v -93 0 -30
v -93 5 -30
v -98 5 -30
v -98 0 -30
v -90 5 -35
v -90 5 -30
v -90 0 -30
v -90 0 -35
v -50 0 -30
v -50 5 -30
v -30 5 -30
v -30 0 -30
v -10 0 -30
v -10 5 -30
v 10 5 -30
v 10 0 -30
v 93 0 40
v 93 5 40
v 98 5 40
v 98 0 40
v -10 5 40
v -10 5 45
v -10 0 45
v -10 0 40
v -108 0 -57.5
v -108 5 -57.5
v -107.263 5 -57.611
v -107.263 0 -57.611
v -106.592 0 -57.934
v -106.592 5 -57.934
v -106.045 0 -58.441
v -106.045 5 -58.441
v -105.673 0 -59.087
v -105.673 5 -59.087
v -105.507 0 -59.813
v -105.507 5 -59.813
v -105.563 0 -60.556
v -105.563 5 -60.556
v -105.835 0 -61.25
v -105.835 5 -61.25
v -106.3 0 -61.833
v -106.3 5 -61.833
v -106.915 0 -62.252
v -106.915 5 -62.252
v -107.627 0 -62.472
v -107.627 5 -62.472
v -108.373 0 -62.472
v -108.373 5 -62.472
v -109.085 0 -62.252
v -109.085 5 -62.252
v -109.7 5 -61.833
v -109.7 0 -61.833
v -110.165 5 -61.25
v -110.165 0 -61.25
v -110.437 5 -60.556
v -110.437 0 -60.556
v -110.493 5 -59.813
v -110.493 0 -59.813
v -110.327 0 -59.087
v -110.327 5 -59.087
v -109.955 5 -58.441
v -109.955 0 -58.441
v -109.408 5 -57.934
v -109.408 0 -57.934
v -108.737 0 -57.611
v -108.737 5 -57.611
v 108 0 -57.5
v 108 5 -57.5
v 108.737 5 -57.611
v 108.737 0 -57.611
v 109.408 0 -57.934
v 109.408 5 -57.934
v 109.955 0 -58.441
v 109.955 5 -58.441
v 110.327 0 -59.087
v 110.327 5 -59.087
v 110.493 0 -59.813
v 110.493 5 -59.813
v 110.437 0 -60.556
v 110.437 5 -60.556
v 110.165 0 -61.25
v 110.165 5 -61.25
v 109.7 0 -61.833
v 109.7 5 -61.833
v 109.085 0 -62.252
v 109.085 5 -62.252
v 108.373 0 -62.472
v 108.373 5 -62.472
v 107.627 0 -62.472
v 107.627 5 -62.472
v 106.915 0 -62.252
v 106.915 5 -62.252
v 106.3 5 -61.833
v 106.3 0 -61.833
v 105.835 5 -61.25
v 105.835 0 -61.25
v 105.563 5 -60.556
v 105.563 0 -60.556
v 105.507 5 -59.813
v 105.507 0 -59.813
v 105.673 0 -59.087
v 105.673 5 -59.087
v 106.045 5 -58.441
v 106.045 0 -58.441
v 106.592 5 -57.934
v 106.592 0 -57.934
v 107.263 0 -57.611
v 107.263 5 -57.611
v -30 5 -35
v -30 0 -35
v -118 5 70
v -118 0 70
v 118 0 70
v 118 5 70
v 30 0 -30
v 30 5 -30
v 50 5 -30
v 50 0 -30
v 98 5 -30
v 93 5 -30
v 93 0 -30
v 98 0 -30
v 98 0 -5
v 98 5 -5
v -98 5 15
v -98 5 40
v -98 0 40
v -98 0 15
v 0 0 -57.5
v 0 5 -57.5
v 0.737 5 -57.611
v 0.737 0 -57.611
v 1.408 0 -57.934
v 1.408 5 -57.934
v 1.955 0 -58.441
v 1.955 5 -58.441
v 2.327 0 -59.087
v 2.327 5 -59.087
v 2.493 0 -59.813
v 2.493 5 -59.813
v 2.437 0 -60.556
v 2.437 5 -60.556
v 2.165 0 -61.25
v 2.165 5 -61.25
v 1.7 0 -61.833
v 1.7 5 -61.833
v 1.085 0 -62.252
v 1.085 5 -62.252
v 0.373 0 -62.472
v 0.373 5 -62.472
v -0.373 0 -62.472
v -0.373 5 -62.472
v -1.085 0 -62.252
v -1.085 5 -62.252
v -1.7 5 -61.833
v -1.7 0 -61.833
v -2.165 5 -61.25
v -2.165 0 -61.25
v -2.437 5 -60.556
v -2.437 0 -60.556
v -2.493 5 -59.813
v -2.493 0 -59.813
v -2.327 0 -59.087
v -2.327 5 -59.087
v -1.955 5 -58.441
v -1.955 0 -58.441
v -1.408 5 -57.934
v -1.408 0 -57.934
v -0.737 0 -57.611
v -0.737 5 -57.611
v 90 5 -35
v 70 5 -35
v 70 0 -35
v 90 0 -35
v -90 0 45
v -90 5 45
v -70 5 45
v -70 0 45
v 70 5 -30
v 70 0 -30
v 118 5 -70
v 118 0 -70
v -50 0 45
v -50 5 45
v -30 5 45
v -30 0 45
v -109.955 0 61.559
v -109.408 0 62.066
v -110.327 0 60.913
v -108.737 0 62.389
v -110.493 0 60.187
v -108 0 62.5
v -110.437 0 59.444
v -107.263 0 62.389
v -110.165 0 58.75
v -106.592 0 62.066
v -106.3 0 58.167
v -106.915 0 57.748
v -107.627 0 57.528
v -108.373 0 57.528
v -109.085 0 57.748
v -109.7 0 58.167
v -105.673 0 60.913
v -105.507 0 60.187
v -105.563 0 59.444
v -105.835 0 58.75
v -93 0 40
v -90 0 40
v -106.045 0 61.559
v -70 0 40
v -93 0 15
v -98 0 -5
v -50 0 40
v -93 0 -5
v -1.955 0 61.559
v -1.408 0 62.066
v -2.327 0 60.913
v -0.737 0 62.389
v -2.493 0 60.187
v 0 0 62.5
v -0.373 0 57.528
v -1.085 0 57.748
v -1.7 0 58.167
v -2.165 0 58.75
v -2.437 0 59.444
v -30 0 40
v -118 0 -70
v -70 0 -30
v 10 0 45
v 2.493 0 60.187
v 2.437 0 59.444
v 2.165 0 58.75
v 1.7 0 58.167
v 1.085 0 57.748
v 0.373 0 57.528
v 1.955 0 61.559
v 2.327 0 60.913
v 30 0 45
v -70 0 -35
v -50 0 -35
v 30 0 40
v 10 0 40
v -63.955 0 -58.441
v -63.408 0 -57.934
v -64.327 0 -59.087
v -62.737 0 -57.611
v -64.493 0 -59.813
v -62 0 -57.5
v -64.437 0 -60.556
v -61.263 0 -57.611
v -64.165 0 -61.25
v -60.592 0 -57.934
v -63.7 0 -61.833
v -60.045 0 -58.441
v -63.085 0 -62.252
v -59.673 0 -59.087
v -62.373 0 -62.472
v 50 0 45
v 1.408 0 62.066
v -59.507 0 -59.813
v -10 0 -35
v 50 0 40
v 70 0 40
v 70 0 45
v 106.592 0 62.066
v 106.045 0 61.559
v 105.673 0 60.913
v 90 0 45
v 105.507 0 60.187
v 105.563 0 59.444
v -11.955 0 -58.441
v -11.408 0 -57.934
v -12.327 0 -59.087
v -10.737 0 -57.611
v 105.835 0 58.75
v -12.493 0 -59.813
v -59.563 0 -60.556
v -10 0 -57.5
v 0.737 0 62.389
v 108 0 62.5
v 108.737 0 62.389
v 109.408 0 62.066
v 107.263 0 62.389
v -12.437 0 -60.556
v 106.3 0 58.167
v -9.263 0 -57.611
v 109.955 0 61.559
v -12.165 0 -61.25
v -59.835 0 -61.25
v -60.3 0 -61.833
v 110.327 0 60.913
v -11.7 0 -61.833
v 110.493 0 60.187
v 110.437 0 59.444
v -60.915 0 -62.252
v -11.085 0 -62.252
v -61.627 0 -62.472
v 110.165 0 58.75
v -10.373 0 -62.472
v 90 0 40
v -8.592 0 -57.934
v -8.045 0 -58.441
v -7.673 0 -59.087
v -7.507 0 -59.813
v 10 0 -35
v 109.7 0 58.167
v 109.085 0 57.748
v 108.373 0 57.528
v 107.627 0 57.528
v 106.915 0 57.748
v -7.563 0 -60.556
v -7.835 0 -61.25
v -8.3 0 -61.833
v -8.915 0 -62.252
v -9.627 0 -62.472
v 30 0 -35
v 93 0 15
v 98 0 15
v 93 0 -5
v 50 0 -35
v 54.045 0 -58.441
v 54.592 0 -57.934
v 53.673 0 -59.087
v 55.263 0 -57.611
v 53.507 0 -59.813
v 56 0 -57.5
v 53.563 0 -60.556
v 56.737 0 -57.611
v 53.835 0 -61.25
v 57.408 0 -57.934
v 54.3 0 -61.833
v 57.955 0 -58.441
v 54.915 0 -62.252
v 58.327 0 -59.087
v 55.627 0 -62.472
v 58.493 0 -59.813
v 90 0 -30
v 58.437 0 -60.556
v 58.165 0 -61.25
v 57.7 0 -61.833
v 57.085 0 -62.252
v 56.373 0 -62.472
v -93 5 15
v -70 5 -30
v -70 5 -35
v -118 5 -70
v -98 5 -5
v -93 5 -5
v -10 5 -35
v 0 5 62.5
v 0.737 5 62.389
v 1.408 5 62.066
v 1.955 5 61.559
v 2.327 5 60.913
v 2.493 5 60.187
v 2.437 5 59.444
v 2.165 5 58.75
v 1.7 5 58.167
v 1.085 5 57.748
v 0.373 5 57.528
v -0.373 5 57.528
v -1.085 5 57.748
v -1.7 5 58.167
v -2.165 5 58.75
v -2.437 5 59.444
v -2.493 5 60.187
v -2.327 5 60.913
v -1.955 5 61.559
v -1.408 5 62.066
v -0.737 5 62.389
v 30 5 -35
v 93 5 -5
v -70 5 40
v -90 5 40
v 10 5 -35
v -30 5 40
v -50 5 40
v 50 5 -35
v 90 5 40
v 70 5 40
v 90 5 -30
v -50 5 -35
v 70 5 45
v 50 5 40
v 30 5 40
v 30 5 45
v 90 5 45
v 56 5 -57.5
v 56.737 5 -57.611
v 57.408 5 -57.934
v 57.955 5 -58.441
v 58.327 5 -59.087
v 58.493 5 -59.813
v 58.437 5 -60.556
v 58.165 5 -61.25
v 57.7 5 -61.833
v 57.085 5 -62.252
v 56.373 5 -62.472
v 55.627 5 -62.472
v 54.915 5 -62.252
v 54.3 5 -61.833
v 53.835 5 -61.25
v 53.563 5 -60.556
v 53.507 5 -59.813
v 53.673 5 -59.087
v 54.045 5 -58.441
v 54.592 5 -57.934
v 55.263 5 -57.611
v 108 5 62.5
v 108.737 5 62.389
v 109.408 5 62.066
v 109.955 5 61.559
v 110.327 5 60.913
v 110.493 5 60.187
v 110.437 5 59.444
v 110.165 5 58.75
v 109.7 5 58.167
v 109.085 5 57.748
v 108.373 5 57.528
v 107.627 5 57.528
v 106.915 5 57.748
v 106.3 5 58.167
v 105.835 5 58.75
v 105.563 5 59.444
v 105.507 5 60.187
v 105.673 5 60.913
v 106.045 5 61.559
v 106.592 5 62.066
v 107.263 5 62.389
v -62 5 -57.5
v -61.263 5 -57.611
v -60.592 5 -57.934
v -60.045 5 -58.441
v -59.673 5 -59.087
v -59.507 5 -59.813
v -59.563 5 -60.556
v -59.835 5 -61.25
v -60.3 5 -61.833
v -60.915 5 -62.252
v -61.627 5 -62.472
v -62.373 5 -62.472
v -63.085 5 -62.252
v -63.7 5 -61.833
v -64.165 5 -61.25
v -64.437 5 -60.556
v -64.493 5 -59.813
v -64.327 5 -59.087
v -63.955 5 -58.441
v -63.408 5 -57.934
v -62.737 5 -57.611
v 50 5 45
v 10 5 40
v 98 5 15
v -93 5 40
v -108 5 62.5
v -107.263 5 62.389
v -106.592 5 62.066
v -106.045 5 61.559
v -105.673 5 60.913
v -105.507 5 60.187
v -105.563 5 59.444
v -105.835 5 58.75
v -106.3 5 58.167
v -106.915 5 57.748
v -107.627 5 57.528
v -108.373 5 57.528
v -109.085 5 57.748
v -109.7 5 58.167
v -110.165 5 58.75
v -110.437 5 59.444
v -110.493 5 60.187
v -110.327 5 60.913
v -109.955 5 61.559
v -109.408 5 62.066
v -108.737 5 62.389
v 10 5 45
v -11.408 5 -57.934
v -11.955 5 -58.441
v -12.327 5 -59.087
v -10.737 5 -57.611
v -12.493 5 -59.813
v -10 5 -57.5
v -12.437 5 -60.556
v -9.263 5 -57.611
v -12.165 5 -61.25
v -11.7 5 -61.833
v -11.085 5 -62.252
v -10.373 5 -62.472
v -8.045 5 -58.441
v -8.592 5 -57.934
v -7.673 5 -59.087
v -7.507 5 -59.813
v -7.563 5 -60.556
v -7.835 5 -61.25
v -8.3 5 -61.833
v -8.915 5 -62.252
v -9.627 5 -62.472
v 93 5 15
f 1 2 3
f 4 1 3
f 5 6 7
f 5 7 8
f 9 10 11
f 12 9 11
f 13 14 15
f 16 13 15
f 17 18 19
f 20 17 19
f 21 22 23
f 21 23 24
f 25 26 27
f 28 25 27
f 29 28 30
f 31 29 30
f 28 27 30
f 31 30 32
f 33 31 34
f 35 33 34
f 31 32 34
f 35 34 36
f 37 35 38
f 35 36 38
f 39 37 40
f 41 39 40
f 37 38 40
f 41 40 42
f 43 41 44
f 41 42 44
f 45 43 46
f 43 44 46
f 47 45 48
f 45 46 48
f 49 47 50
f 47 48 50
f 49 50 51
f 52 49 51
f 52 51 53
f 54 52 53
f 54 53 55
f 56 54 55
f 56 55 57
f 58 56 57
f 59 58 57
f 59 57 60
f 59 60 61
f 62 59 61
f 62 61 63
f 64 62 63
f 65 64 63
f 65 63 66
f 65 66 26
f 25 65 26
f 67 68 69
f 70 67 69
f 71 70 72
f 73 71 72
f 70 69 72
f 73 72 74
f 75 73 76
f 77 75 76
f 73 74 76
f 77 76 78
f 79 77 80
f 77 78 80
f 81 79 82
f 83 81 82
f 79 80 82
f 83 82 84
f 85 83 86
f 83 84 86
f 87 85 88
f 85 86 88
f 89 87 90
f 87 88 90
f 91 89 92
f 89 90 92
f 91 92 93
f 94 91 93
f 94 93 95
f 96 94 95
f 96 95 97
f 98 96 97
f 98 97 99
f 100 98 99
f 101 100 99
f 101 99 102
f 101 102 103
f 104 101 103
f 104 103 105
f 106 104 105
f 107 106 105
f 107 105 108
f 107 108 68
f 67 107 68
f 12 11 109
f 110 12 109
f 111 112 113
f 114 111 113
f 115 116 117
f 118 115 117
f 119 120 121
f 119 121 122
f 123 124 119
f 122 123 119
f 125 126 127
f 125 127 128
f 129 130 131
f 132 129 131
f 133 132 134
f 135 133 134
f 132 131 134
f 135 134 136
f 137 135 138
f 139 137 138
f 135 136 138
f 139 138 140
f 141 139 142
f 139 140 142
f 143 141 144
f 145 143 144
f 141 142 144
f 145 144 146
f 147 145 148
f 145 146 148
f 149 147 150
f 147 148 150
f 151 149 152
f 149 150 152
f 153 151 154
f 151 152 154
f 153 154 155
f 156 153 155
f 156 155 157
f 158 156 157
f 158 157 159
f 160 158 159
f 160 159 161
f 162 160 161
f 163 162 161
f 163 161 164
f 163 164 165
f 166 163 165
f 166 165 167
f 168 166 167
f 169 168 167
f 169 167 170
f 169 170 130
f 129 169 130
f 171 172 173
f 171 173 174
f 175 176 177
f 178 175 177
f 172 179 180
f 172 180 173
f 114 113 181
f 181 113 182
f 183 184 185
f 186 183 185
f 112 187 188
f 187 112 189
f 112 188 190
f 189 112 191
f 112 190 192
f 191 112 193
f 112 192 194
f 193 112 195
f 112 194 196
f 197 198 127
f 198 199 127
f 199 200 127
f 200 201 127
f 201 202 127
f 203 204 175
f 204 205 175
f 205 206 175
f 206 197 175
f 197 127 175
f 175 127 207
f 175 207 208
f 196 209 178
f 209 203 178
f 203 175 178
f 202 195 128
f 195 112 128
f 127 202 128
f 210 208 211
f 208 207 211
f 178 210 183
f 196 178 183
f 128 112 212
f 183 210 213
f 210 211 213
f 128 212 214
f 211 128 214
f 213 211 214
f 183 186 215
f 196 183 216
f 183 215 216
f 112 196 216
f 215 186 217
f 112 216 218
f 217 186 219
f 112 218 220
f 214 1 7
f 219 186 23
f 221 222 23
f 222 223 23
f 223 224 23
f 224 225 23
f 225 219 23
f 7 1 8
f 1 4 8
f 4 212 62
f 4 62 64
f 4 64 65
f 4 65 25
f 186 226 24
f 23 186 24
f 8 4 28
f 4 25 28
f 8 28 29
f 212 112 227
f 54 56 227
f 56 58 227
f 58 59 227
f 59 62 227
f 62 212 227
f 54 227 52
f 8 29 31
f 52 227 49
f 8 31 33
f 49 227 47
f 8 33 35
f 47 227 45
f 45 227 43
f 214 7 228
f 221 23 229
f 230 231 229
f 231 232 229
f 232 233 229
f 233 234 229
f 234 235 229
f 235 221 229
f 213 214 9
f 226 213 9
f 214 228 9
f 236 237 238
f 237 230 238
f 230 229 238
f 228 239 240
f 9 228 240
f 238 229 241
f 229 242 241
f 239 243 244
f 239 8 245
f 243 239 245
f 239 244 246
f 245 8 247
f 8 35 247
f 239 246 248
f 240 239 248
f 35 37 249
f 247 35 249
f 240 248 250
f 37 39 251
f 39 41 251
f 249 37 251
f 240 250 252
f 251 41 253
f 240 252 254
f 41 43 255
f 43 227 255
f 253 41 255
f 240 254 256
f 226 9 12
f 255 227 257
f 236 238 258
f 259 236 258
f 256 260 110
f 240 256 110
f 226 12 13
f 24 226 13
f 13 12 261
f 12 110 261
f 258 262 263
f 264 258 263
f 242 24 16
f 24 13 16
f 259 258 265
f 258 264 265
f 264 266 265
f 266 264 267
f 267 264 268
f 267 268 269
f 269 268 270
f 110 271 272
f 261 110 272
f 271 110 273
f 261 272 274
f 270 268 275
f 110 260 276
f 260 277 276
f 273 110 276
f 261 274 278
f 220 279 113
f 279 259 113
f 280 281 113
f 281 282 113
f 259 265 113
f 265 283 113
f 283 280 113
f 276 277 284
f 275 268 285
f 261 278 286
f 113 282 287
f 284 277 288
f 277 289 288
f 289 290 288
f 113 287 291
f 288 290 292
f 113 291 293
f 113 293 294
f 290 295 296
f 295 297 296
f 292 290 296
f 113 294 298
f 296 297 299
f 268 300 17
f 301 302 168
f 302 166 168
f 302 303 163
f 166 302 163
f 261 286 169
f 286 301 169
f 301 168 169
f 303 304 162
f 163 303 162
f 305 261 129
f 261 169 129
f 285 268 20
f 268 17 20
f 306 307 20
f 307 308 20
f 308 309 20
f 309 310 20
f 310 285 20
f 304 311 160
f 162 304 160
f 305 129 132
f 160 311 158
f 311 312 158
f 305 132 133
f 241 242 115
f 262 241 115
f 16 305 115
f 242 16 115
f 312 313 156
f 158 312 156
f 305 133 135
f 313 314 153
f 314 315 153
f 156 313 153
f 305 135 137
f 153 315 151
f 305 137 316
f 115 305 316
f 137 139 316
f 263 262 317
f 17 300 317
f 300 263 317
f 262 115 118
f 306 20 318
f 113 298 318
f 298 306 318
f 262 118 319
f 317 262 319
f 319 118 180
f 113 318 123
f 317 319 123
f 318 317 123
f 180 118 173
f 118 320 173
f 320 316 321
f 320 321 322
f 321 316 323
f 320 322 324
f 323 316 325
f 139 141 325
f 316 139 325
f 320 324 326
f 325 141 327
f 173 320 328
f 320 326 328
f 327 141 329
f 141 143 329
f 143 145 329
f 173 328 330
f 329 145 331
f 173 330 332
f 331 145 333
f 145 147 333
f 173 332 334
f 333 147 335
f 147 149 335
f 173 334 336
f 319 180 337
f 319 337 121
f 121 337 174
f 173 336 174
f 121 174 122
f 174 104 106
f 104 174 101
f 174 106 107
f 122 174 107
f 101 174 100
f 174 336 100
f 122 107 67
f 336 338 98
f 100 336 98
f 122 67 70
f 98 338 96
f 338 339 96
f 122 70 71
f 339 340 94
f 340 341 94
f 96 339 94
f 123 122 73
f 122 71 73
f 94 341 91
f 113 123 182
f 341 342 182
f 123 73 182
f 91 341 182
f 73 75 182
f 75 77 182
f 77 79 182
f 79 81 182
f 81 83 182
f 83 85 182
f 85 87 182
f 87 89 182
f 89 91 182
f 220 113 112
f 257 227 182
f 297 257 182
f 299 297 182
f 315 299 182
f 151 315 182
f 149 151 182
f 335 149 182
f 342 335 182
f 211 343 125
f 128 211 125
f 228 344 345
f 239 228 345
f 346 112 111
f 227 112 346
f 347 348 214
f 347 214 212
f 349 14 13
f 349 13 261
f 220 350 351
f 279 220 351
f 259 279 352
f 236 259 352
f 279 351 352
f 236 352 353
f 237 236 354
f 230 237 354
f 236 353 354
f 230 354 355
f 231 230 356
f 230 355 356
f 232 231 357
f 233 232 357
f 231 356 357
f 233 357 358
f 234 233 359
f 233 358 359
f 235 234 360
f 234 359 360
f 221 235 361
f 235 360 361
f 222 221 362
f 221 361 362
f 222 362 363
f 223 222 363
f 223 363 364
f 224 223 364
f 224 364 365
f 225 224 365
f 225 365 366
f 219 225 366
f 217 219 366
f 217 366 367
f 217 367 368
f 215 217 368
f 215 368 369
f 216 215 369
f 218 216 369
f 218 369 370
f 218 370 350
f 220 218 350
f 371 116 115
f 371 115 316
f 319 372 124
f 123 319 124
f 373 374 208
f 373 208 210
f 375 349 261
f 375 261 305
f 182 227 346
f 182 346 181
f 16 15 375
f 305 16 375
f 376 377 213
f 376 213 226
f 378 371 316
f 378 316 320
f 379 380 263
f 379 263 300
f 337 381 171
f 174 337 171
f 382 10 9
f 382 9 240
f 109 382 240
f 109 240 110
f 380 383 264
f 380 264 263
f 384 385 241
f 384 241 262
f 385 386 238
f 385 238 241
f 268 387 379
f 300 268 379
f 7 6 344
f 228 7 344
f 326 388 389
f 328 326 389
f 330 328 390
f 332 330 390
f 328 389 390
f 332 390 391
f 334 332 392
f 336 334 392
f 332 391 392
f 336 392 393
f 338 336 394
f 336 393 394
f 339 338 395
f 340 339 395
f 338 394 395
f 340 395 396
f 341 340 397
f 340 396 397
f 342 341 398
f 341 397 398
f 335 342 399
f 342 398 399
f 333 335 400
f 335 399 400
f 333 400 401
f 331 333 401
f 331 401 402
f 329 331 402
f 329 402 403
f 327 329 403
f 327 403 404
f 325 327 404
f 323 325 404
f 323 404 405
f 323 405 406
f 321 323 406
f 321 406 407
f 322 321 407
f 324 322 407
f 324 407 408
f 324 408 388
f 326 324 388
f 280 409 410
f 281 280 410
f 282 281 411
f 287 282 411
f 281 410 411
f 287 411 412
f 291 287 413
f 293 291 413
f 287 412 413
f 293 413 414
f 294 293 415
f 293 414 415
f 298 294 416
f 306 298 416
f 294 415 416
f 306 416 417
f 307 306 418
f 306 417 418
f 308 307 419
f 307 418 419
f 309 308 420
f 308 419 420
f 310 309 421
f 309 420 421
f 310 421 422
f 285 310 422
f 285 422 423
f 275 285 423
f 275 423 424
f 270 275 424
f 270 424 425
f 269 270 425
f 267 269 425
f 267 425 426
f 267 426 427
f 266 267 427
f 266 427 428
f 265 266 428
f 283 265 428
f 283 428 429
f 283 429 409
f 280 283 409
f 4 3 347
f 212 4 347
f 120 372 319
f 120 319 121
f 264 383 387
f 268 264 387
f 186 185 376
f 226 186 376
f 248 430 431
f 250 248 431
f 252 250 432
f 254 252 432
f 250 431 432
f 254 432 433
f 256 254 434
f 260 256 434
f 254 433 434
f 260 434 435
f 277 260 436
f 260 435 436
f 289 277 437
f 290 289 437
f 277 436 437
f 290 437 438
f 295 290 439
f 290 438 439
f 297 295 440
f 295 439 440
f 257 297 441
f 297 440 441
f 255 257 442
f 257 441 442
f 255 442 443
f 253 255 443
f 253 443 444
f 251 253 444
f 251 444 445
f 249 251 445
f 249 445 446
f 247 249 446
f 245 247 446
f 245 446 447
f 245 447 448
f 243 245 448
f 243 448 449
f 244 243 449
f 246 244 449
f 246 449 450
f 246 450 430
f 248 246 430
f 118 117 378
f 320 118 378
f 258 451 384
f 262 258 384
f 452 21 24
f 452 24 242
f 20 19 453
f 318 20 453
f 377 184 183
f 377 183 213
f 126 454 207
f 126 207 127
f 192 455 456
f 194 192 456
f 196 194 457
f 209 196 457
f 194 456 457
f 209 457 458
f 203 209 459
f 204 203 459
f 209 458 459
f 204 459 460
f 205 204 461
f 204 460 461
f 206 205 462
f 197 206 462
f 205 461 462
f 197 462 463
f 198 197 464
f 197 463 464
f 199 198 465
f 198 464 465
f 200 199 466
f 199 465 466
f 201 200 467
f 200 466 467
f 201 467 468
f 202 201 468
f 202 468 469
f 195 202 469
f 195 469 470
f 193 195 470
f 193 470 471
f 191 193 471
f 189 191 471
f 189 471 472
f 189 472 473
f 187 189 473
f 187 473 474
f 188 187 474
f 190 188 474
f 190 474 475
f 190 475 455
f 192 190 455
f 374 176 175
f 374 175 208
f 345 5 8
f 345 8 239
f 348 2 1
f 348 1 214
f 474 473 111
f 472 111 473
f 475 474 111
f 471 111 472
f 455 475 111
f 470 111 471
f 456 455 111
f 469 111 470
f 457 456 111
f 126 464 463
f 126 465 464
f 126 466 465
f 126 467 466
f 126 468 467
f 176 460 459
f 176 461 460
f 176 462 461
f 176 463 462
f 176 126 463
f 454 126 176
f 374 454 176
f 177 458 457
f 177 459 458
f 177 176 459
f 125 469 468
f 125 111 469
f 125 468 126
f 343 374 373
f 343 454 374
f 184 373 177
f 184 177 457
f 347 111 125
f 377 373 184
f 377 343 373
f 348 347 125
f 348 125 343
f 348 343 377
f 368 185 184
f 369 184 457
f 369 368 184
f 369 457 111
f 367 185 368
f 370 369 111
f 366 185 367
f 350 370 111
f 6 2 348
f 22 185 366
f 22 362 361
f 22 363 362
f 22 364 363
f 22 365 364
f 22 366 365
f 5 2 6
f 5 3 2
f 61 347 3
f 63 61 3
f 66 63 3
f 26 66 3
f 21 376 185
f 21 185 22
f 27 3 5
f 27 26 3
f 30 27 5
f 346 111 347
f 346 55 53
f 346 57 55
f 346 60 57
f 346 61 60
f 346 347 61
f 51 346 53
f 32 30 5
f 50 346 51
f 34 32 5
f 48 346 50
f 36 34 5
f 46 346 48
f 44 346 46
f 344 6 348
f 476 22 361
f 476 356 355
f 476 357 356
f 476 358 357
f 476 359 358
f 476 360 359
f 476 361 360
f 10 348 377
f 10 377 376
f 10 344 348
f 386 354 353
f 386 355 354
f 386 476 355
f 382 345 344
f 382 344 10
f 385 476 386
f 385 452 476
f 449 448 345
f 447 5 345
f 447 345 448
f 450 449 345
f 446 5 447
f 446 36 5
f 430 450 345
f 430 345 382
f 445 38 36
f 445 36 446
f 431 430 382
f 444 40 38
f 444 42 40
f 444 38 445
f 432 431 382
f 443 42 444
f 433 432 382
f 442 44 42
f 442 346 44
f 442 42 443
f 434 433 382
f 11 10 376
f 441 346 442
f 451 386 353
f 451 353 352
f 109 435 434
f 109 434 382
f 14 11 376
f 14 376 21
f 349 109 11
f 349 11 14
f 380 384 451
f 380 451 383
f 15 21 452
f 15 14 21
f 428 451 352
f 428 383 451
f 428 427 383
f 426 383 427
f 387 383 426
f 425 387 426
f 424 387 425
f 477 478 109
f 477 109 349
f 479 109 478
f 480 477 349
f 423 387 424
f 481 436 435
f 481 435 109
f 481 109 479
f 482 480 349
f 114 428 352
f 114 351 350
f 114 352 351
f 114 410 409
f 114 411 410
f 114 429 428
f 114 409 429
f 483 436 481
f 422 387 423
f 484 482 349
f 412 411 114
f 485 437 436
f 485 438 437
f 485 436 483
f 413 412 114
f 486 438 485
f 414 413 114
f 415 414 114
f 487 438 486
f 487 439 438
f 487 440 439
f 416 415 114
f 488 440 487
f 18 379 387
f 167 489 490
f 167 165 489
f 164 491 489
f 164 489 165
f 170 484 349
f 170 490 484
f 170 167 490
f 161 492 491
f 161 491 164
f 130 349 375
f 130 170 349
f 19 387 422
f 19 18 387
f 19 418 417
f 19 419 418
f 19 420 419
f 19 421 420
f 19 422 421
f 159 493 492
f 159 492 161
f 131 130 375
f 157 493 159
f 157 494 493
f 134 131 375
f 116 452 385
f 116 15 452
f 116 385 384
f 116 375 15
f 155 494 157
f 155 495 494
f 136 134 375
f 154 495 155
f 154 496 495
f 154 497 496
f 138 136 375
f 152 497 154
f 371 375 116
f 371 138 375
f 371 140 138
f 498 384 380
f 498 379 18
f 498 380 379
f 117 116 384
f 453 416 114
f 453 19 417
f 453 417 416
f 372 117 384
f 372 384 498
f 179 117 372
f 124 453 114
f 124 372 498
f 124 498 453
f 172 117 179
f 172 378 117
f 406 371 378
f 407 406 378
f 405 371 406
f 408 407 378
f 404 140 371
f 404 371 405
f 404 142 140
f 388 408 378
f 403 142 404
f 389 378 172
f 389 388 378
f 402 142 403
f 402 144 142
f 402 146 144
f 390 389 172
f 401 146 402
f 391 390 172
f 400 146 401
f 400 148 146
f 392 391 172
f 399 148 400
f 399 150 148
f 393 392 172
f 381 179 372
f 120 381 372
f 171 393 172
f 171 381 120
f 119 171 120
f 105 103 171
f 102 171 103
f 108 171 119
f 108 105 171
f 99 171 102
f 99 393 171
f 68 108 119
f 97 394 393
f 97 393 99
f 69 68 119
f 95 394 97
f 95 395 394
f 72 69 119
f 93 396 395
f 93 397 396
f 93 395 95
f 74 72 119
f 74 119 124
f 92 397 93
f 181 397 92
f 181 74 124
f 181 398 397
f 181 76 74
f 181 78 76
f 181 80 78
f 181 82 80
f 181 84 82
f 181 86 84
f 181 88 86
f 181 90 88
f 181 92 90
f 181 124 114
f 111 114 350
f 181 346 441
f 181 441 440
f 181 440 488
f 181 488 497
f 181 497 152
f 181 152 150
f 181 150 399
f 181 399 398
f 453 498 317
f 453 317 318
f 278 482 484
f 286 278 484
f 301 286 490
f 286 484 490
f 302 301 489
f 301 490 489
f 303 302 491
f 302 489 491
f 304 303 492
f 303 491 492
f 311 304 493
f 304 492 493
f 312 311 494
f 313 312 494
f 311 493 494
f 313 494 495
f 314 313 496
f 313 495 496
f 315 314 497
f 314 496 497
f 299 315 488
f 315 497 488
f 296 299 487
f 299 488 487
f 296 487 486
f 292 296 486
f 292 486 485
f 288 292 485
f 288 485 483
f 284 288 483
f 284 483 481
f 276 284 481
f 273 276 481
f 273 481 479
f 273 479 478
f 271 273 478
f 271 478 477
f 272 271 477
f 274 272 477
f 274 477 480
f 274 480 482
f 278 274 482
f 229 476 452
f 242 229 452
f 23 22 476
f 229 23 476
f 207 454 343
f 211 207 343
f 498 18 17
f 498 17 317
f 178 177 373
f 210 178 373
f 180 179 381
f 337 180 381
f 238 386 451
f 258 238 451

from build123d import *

# Parameters (mm, degrees)
SKETCH_1_W                       = 236
SKETCH_1_H                       = 140
EXTRUDE_1_DEPTH                  = 5
CUT_EXTRUDE_1_REACH              = 139.292
SKETCH_2_W                       = 20
SKETCH_2_H                       = 5
PATTERN_LINEAR_1_COUNT           = 3
PATTERN_LINEAR_1_PITCH           = 40
PATTERN_LINEAR_2_COUNT           = 3
PATTERN_LINEAR_2_PITCH           = 40
CUT_EXTRUDE_2_REACH              = 139.292
SKETCH_3_W                       = 5
SKETCH_3_H                       = 25
PATTERN_LINEAR_6_COUNT           = 2
PATTERN_LINEAR_6_PITCH           = 75
PATTERN_LINEAR_6_COPY_1_REACH    = 139.292
PATTERN_LINEAR_6_COPY_1_SKETCH_W = 20
PATTERN_LINEAR_6_COPY_1_SKETCH_H = 5
PATTERN_LINEAR_6_COPY_2_REACH    = 139.292
PATTERN_LINEAR_6_COPY_2_SKETCH_W = 20
PATTERN_LINEAR_6_COPY_2_SKETCH_H = 5
PATTERN_LINEAR_6_COPY_3_REACH    = 139.292
PATTERN_LINEAR_6_COPY_3_SKETCH_W = 20
PATTERN_LINEAR_6_COPY_3_SKETCH_H = 5
PATTERN_LINEAR_6_COPY_4_REACH    = 139.292
PATTERN_LINEAR_6_COPY_4_SKETCH_W = 20
PATTERN_LINEAR_6_COPY_4_SKETCH_H = 5
PATTERN_LINEAR_7_COUNT           = 2
PATTERN_LINEAR_7_PITCH           = 45
PATTERN_LINEAR_7_COPY_1_REACH    = 139.292
PATTERN_LINEAR_7_COPY_1_SKETCH_W = 5
PATTERN_LINEAR_7_COPY_1_SKETCH_H = 25
SKETCH_4_R                       = 2.5
CUT_EXTRUDE_3_DEPTH              = 10


with BuildPart() as part:
    # 스케치1 → 보스-돌출1 (new body)
    with BuildSketch(Plane(origin=(0, 0, 0), x_dir=(1, 0, 0), z_dir=(0, 1, 0))):
        Rectangle(SKETCH_1_W, SKETCH_1_H)
    extrude(amount=EXTRUDE_1_DEPTH)

    # 스케치2 → 컷-돌출1 (cut, up to next)
    with BuildSketch(Plane(origin=(0, 5, 0), x_dir=(1, 0, 0), z_dir=(0, 1, 0)), mode=Mode.PRIVATE) as cut_extrude_1_sk1:
        with Locations((0, -42.5)):
            Rectangle(SKETCH_2_W, SKETCH_2_H)
    cut_extrude_1_tool1 = extrude(cut_extrude_1_sk1.sketch, amount=-CUT_EXTRUDE_1_REACH, mode=Mode.PRIVATE) & part.part
    cut_extrude_1 = cut_extrude_1_tool1.solids().sort_by_distance((0, 5, 42.5))[0]
    add(cut_extrude_1, mode=Mode.SUBTRACT)

    # 선형 패턴1: 컷-돌출1 ×3
    with Locations(*[(i * PATTERN_LINEAR_1_PITCH, 0, 0) for i in range(1, PATTERN_LINEAR_1_COUNT)]):
        add(cut_extrude_1, mode=Mode.SUBTRACT)

    # 선형 패턴2: 컷-돌출1 ×3
    with Locations(*[(-i * PATTERN_LINEAR_2_PITCH, 0, 0) for i in range(1, PATTERN_LINEAR_2_COUNT)]):
        add(cut_extrude_1, mode=Mode.SUBTRACT)

    # 스케치3 → 컷-돌출2 (cut, up to next)
    with BuildSketch(Plane(origin=(0, 5, 0), x_dir=(1, 0, 0), z_dir=(0, 1, 0)), mode=Mode.PRIVATE) as cut_extrude_2_sk1:
        with Locations((95.5, -27.5)):
            Rectangle(SKETCH_3_W, SKETCH_3_H)
    cut_extrude_2_tool1 = extrude(cut_extrude_2_sk1.sketch, amount=-CUT_EXTRUDE_2_REACH, mode=Mode.PRIVATE) & part.part
    cut_extrude_2 = cut_extrude_2_tool1.solids().sort_by_distance((95.5, 5, 27.5))[0]
    add(cut_extrude_2, mode=Mode.SUBTRACT)

    # 대칭 복사3: 컷-돌출2 across plane
    add(cut_extrude_2.mirror(Plane(origin=(0, 0, 0), x_dir=(0, 0, 1), z_dir=(1, 0, 0))), mode=Mode.SUBTRACT)

    # 선형 패턴6: 컷-돌출1 ×2
    with Locations(*[(0, 0, -i * PATTERN_LINEAR_6_PITCH) for i in range(1, PATTERN_LINEAR_6_COUNT)]):
        add(cut_extrude_1, mode=Mode.SUBTRACT)

    # 선형 패턴6 copy 1 sketch → 선형 패턴6 copy 1 (cut, up to next)
    with BuildSketch(Plane(origin=(40, 5, -75), x_dir=(1, 0, 0), z_dir=(0, 1, 0)), mode=Mode.PRIVATE) as pattern_linear_6_copy_1_sk1:
        with Locations((0, -42.5)):
            Rectangle(PATTERN_LINEAR_6_COPY_1_SKETCH_W, PATTERN_LINEAR_6_COPY_1_SKETCH_H)
    pattern_linear_6_copy_1_tool1 = extrude(pattern_linear_6_copy_1_sk1.sketch, amount=-PATTERN_LINEAR_6_COPY_1_REACH, mode=Mode.PRIVATE) & part.part
    add(pattern_linear_6_copy_1_tool1.solids().sort_by_distance((40, 5, -32.5))[0], mode=Mode.SUBTRACT)

    # 선형 패턴6 copy 2 sketch → 선형 패턴6 copy 2 (cut, up to next)
    with BuildSketch(Plane(origin=(80, 5, -75), x_dir=(1, 0, 0), z_dir=(0, 1, 0)), mode=Mode.PRIVATE) as pattern_linear_6_copy_2_sk1:
        with Locations((0, -42.5)):
            Rectangle(PATTERN_LINEAR_6_COPY_2_SKETCH_W, PATTERN_LINEAR_6_COPY_2_SKETCH_H)
    pattern_linear_6_copy_2_tool1 = extrude(pattern_linear_6_copy_2_sk1.sketch, amount=-PATTERN_LINEAR_6_COPY_2_REACH, mode=Mode.PRIVATE) & part.part
    add(pattern_linear_6_copy_2_tool1.solids().sort_by_distance((80, 5, -32.5))[0], mode=Mode.SUBTRACT)

    # 선형 패턴6 copy 3 sketch → 선형 패턴6 copy 3 (cut, up to next)
    with BuildSketch(Plane(origin=(-40, 5, -75), x_dir=(1, 0, 0), z_dir=(0, 1, 0)), mode=Mode.PRIVATE) as pattern_linear_6_copy_3_sk1:
        with Locations((0, -42.5)):
            Rectangle(PATTERN_LINEAR_6_COPY_3_SKETCH_W, PATTERN_LINEAR_6_COPY_3_SKETCH_H)
    pattern_linear_6_copy_3_tool1 = extrude(pattern_linear_6_copy_3_sk1.sketch, amount=-PATTERN_LINEAR_6_COPY_3_REACH, mode=Mode.PRIVATE) & part.part
    add(pattern_linear_6_copy_3_tool1.solids().sort_by_distance((-40, 5, -32.5))[0], mode=Mode.SUBTRACT)

    # 선형 패턴6 copy 4 sketch → 선형 패턴6 copy 4 (cut, up to next)
    with BuildSketch(Plane(origin=(-80, 5, -75), x_dir=(1, 0, 0), z_dir=(0, 1, 0)), mode=Mode.PRIVATE) as pattern_linear_6_copy_4_sk1:
        with Locations((0, -42.5)):
            Rectangle(PATTERN_LINEAR_6_COPY_4_SKETCH_W, PATTERN_LINEAR_6_COPY_4_SKETCH_H)
    pattern_linear_6_copy_4_tool1 = extrude(pattern_linear_6_copy_4_sk1.sketch, amount=-PATTERN_LINEAR_6_COPY_4_REACH, mode=Mode.PRIVATE) & part.part
    add(pattern_linear_6_copy_4_tool1.solids().sort_by_distance((-80, 5, -32.5))[0], mode=Mode.SUBTRACT)

    # 선형 패턴7: 컷-돌출2 ×2
    with Locations(*[(0, 0, -i * PATTERN_LINEAR_7_PITCH) for i in range(1, PATTERN_LINEAR_7_COUNT)]):
        add(cut_extrude_2, mode=Mode.SUBTRACT)

    # 선형 패턴7 copy 1 sketch → 선형 패턴7 copy 1 (cut, up to next)
    with BuildSketch(Plane(origin=(0, 5, -45), x_dir=(-1, 0, 0), z_dir=(0, 1, 0)), mode=Mode.PRIVATE) as pattern_linear_7_copy_1_sk1:
        with Locations((95.5, 27.5)):
            Rectangle(PATTERN_LINEAR_7_COPY_1_SKETCH_W, PATTERN_LINEAR_7_COPY_1_SKETCH_H)
    pattern_linear_7_copy_1_tool1 = extrude(pattern_linear_7_copy_1_sk1.sketch, amount=-PATTERN_LINEAR_7_COPY_1_REACH, mode=Mode.PRIVATE) & part.part
    add(pattern_linear_7_copy_1_tool1.solids().sort_by_distance((-95.5, 5, -17.5))[0], mode=Mode.SUBTRACT)

    # 스케치4 → 컷-돌출3 (cut)
    with BuildSketch(Plane(origin=(0, 5, 0), x_dir=(1, 0, 0), z_dir=(0, 1, 0))):
        with Locations(Location((-108, 60, 0), (0, 0, 270))):
            Circle(SKETCH_4_R)
        with Locations(Location((108, -60, 0), (0, 0, 270))):
            Circle(SKETCH_4_R)
        with Locations(Location((-108, -60, 0), (0, 0, 270))):
            Circle(SKETCH_4_R)
        with Locations(Location((108, 60, 0), (0, 0, 270))):
            Circle(SKETCH_4_R)
        with Locations(Location((0, 60, 0), (0, 0, 270))):
            Circle(SKETCH_4_R)
        with Locations(Location((0, -60, 0), (0, 0, 270))):
            Circle(SKETCH_4_R)
        with Locations(Location((-62, 60, 0), (0, 0, 270))):
            Circle(SKETCH_4_R)
        with Locations(Location((56, 60, 0), (0, 0, 270))):
            Circle(SKETCH_4_R)
        with Locations(Location((-10, 60, 0), (0, 0, 270))):
            Circle(SKETCH_4_R)
    extrude(amount=-CUT_EXTRUDE_3_DEPTH, mode=Mode.SUBTRACT)


solid = part.part
